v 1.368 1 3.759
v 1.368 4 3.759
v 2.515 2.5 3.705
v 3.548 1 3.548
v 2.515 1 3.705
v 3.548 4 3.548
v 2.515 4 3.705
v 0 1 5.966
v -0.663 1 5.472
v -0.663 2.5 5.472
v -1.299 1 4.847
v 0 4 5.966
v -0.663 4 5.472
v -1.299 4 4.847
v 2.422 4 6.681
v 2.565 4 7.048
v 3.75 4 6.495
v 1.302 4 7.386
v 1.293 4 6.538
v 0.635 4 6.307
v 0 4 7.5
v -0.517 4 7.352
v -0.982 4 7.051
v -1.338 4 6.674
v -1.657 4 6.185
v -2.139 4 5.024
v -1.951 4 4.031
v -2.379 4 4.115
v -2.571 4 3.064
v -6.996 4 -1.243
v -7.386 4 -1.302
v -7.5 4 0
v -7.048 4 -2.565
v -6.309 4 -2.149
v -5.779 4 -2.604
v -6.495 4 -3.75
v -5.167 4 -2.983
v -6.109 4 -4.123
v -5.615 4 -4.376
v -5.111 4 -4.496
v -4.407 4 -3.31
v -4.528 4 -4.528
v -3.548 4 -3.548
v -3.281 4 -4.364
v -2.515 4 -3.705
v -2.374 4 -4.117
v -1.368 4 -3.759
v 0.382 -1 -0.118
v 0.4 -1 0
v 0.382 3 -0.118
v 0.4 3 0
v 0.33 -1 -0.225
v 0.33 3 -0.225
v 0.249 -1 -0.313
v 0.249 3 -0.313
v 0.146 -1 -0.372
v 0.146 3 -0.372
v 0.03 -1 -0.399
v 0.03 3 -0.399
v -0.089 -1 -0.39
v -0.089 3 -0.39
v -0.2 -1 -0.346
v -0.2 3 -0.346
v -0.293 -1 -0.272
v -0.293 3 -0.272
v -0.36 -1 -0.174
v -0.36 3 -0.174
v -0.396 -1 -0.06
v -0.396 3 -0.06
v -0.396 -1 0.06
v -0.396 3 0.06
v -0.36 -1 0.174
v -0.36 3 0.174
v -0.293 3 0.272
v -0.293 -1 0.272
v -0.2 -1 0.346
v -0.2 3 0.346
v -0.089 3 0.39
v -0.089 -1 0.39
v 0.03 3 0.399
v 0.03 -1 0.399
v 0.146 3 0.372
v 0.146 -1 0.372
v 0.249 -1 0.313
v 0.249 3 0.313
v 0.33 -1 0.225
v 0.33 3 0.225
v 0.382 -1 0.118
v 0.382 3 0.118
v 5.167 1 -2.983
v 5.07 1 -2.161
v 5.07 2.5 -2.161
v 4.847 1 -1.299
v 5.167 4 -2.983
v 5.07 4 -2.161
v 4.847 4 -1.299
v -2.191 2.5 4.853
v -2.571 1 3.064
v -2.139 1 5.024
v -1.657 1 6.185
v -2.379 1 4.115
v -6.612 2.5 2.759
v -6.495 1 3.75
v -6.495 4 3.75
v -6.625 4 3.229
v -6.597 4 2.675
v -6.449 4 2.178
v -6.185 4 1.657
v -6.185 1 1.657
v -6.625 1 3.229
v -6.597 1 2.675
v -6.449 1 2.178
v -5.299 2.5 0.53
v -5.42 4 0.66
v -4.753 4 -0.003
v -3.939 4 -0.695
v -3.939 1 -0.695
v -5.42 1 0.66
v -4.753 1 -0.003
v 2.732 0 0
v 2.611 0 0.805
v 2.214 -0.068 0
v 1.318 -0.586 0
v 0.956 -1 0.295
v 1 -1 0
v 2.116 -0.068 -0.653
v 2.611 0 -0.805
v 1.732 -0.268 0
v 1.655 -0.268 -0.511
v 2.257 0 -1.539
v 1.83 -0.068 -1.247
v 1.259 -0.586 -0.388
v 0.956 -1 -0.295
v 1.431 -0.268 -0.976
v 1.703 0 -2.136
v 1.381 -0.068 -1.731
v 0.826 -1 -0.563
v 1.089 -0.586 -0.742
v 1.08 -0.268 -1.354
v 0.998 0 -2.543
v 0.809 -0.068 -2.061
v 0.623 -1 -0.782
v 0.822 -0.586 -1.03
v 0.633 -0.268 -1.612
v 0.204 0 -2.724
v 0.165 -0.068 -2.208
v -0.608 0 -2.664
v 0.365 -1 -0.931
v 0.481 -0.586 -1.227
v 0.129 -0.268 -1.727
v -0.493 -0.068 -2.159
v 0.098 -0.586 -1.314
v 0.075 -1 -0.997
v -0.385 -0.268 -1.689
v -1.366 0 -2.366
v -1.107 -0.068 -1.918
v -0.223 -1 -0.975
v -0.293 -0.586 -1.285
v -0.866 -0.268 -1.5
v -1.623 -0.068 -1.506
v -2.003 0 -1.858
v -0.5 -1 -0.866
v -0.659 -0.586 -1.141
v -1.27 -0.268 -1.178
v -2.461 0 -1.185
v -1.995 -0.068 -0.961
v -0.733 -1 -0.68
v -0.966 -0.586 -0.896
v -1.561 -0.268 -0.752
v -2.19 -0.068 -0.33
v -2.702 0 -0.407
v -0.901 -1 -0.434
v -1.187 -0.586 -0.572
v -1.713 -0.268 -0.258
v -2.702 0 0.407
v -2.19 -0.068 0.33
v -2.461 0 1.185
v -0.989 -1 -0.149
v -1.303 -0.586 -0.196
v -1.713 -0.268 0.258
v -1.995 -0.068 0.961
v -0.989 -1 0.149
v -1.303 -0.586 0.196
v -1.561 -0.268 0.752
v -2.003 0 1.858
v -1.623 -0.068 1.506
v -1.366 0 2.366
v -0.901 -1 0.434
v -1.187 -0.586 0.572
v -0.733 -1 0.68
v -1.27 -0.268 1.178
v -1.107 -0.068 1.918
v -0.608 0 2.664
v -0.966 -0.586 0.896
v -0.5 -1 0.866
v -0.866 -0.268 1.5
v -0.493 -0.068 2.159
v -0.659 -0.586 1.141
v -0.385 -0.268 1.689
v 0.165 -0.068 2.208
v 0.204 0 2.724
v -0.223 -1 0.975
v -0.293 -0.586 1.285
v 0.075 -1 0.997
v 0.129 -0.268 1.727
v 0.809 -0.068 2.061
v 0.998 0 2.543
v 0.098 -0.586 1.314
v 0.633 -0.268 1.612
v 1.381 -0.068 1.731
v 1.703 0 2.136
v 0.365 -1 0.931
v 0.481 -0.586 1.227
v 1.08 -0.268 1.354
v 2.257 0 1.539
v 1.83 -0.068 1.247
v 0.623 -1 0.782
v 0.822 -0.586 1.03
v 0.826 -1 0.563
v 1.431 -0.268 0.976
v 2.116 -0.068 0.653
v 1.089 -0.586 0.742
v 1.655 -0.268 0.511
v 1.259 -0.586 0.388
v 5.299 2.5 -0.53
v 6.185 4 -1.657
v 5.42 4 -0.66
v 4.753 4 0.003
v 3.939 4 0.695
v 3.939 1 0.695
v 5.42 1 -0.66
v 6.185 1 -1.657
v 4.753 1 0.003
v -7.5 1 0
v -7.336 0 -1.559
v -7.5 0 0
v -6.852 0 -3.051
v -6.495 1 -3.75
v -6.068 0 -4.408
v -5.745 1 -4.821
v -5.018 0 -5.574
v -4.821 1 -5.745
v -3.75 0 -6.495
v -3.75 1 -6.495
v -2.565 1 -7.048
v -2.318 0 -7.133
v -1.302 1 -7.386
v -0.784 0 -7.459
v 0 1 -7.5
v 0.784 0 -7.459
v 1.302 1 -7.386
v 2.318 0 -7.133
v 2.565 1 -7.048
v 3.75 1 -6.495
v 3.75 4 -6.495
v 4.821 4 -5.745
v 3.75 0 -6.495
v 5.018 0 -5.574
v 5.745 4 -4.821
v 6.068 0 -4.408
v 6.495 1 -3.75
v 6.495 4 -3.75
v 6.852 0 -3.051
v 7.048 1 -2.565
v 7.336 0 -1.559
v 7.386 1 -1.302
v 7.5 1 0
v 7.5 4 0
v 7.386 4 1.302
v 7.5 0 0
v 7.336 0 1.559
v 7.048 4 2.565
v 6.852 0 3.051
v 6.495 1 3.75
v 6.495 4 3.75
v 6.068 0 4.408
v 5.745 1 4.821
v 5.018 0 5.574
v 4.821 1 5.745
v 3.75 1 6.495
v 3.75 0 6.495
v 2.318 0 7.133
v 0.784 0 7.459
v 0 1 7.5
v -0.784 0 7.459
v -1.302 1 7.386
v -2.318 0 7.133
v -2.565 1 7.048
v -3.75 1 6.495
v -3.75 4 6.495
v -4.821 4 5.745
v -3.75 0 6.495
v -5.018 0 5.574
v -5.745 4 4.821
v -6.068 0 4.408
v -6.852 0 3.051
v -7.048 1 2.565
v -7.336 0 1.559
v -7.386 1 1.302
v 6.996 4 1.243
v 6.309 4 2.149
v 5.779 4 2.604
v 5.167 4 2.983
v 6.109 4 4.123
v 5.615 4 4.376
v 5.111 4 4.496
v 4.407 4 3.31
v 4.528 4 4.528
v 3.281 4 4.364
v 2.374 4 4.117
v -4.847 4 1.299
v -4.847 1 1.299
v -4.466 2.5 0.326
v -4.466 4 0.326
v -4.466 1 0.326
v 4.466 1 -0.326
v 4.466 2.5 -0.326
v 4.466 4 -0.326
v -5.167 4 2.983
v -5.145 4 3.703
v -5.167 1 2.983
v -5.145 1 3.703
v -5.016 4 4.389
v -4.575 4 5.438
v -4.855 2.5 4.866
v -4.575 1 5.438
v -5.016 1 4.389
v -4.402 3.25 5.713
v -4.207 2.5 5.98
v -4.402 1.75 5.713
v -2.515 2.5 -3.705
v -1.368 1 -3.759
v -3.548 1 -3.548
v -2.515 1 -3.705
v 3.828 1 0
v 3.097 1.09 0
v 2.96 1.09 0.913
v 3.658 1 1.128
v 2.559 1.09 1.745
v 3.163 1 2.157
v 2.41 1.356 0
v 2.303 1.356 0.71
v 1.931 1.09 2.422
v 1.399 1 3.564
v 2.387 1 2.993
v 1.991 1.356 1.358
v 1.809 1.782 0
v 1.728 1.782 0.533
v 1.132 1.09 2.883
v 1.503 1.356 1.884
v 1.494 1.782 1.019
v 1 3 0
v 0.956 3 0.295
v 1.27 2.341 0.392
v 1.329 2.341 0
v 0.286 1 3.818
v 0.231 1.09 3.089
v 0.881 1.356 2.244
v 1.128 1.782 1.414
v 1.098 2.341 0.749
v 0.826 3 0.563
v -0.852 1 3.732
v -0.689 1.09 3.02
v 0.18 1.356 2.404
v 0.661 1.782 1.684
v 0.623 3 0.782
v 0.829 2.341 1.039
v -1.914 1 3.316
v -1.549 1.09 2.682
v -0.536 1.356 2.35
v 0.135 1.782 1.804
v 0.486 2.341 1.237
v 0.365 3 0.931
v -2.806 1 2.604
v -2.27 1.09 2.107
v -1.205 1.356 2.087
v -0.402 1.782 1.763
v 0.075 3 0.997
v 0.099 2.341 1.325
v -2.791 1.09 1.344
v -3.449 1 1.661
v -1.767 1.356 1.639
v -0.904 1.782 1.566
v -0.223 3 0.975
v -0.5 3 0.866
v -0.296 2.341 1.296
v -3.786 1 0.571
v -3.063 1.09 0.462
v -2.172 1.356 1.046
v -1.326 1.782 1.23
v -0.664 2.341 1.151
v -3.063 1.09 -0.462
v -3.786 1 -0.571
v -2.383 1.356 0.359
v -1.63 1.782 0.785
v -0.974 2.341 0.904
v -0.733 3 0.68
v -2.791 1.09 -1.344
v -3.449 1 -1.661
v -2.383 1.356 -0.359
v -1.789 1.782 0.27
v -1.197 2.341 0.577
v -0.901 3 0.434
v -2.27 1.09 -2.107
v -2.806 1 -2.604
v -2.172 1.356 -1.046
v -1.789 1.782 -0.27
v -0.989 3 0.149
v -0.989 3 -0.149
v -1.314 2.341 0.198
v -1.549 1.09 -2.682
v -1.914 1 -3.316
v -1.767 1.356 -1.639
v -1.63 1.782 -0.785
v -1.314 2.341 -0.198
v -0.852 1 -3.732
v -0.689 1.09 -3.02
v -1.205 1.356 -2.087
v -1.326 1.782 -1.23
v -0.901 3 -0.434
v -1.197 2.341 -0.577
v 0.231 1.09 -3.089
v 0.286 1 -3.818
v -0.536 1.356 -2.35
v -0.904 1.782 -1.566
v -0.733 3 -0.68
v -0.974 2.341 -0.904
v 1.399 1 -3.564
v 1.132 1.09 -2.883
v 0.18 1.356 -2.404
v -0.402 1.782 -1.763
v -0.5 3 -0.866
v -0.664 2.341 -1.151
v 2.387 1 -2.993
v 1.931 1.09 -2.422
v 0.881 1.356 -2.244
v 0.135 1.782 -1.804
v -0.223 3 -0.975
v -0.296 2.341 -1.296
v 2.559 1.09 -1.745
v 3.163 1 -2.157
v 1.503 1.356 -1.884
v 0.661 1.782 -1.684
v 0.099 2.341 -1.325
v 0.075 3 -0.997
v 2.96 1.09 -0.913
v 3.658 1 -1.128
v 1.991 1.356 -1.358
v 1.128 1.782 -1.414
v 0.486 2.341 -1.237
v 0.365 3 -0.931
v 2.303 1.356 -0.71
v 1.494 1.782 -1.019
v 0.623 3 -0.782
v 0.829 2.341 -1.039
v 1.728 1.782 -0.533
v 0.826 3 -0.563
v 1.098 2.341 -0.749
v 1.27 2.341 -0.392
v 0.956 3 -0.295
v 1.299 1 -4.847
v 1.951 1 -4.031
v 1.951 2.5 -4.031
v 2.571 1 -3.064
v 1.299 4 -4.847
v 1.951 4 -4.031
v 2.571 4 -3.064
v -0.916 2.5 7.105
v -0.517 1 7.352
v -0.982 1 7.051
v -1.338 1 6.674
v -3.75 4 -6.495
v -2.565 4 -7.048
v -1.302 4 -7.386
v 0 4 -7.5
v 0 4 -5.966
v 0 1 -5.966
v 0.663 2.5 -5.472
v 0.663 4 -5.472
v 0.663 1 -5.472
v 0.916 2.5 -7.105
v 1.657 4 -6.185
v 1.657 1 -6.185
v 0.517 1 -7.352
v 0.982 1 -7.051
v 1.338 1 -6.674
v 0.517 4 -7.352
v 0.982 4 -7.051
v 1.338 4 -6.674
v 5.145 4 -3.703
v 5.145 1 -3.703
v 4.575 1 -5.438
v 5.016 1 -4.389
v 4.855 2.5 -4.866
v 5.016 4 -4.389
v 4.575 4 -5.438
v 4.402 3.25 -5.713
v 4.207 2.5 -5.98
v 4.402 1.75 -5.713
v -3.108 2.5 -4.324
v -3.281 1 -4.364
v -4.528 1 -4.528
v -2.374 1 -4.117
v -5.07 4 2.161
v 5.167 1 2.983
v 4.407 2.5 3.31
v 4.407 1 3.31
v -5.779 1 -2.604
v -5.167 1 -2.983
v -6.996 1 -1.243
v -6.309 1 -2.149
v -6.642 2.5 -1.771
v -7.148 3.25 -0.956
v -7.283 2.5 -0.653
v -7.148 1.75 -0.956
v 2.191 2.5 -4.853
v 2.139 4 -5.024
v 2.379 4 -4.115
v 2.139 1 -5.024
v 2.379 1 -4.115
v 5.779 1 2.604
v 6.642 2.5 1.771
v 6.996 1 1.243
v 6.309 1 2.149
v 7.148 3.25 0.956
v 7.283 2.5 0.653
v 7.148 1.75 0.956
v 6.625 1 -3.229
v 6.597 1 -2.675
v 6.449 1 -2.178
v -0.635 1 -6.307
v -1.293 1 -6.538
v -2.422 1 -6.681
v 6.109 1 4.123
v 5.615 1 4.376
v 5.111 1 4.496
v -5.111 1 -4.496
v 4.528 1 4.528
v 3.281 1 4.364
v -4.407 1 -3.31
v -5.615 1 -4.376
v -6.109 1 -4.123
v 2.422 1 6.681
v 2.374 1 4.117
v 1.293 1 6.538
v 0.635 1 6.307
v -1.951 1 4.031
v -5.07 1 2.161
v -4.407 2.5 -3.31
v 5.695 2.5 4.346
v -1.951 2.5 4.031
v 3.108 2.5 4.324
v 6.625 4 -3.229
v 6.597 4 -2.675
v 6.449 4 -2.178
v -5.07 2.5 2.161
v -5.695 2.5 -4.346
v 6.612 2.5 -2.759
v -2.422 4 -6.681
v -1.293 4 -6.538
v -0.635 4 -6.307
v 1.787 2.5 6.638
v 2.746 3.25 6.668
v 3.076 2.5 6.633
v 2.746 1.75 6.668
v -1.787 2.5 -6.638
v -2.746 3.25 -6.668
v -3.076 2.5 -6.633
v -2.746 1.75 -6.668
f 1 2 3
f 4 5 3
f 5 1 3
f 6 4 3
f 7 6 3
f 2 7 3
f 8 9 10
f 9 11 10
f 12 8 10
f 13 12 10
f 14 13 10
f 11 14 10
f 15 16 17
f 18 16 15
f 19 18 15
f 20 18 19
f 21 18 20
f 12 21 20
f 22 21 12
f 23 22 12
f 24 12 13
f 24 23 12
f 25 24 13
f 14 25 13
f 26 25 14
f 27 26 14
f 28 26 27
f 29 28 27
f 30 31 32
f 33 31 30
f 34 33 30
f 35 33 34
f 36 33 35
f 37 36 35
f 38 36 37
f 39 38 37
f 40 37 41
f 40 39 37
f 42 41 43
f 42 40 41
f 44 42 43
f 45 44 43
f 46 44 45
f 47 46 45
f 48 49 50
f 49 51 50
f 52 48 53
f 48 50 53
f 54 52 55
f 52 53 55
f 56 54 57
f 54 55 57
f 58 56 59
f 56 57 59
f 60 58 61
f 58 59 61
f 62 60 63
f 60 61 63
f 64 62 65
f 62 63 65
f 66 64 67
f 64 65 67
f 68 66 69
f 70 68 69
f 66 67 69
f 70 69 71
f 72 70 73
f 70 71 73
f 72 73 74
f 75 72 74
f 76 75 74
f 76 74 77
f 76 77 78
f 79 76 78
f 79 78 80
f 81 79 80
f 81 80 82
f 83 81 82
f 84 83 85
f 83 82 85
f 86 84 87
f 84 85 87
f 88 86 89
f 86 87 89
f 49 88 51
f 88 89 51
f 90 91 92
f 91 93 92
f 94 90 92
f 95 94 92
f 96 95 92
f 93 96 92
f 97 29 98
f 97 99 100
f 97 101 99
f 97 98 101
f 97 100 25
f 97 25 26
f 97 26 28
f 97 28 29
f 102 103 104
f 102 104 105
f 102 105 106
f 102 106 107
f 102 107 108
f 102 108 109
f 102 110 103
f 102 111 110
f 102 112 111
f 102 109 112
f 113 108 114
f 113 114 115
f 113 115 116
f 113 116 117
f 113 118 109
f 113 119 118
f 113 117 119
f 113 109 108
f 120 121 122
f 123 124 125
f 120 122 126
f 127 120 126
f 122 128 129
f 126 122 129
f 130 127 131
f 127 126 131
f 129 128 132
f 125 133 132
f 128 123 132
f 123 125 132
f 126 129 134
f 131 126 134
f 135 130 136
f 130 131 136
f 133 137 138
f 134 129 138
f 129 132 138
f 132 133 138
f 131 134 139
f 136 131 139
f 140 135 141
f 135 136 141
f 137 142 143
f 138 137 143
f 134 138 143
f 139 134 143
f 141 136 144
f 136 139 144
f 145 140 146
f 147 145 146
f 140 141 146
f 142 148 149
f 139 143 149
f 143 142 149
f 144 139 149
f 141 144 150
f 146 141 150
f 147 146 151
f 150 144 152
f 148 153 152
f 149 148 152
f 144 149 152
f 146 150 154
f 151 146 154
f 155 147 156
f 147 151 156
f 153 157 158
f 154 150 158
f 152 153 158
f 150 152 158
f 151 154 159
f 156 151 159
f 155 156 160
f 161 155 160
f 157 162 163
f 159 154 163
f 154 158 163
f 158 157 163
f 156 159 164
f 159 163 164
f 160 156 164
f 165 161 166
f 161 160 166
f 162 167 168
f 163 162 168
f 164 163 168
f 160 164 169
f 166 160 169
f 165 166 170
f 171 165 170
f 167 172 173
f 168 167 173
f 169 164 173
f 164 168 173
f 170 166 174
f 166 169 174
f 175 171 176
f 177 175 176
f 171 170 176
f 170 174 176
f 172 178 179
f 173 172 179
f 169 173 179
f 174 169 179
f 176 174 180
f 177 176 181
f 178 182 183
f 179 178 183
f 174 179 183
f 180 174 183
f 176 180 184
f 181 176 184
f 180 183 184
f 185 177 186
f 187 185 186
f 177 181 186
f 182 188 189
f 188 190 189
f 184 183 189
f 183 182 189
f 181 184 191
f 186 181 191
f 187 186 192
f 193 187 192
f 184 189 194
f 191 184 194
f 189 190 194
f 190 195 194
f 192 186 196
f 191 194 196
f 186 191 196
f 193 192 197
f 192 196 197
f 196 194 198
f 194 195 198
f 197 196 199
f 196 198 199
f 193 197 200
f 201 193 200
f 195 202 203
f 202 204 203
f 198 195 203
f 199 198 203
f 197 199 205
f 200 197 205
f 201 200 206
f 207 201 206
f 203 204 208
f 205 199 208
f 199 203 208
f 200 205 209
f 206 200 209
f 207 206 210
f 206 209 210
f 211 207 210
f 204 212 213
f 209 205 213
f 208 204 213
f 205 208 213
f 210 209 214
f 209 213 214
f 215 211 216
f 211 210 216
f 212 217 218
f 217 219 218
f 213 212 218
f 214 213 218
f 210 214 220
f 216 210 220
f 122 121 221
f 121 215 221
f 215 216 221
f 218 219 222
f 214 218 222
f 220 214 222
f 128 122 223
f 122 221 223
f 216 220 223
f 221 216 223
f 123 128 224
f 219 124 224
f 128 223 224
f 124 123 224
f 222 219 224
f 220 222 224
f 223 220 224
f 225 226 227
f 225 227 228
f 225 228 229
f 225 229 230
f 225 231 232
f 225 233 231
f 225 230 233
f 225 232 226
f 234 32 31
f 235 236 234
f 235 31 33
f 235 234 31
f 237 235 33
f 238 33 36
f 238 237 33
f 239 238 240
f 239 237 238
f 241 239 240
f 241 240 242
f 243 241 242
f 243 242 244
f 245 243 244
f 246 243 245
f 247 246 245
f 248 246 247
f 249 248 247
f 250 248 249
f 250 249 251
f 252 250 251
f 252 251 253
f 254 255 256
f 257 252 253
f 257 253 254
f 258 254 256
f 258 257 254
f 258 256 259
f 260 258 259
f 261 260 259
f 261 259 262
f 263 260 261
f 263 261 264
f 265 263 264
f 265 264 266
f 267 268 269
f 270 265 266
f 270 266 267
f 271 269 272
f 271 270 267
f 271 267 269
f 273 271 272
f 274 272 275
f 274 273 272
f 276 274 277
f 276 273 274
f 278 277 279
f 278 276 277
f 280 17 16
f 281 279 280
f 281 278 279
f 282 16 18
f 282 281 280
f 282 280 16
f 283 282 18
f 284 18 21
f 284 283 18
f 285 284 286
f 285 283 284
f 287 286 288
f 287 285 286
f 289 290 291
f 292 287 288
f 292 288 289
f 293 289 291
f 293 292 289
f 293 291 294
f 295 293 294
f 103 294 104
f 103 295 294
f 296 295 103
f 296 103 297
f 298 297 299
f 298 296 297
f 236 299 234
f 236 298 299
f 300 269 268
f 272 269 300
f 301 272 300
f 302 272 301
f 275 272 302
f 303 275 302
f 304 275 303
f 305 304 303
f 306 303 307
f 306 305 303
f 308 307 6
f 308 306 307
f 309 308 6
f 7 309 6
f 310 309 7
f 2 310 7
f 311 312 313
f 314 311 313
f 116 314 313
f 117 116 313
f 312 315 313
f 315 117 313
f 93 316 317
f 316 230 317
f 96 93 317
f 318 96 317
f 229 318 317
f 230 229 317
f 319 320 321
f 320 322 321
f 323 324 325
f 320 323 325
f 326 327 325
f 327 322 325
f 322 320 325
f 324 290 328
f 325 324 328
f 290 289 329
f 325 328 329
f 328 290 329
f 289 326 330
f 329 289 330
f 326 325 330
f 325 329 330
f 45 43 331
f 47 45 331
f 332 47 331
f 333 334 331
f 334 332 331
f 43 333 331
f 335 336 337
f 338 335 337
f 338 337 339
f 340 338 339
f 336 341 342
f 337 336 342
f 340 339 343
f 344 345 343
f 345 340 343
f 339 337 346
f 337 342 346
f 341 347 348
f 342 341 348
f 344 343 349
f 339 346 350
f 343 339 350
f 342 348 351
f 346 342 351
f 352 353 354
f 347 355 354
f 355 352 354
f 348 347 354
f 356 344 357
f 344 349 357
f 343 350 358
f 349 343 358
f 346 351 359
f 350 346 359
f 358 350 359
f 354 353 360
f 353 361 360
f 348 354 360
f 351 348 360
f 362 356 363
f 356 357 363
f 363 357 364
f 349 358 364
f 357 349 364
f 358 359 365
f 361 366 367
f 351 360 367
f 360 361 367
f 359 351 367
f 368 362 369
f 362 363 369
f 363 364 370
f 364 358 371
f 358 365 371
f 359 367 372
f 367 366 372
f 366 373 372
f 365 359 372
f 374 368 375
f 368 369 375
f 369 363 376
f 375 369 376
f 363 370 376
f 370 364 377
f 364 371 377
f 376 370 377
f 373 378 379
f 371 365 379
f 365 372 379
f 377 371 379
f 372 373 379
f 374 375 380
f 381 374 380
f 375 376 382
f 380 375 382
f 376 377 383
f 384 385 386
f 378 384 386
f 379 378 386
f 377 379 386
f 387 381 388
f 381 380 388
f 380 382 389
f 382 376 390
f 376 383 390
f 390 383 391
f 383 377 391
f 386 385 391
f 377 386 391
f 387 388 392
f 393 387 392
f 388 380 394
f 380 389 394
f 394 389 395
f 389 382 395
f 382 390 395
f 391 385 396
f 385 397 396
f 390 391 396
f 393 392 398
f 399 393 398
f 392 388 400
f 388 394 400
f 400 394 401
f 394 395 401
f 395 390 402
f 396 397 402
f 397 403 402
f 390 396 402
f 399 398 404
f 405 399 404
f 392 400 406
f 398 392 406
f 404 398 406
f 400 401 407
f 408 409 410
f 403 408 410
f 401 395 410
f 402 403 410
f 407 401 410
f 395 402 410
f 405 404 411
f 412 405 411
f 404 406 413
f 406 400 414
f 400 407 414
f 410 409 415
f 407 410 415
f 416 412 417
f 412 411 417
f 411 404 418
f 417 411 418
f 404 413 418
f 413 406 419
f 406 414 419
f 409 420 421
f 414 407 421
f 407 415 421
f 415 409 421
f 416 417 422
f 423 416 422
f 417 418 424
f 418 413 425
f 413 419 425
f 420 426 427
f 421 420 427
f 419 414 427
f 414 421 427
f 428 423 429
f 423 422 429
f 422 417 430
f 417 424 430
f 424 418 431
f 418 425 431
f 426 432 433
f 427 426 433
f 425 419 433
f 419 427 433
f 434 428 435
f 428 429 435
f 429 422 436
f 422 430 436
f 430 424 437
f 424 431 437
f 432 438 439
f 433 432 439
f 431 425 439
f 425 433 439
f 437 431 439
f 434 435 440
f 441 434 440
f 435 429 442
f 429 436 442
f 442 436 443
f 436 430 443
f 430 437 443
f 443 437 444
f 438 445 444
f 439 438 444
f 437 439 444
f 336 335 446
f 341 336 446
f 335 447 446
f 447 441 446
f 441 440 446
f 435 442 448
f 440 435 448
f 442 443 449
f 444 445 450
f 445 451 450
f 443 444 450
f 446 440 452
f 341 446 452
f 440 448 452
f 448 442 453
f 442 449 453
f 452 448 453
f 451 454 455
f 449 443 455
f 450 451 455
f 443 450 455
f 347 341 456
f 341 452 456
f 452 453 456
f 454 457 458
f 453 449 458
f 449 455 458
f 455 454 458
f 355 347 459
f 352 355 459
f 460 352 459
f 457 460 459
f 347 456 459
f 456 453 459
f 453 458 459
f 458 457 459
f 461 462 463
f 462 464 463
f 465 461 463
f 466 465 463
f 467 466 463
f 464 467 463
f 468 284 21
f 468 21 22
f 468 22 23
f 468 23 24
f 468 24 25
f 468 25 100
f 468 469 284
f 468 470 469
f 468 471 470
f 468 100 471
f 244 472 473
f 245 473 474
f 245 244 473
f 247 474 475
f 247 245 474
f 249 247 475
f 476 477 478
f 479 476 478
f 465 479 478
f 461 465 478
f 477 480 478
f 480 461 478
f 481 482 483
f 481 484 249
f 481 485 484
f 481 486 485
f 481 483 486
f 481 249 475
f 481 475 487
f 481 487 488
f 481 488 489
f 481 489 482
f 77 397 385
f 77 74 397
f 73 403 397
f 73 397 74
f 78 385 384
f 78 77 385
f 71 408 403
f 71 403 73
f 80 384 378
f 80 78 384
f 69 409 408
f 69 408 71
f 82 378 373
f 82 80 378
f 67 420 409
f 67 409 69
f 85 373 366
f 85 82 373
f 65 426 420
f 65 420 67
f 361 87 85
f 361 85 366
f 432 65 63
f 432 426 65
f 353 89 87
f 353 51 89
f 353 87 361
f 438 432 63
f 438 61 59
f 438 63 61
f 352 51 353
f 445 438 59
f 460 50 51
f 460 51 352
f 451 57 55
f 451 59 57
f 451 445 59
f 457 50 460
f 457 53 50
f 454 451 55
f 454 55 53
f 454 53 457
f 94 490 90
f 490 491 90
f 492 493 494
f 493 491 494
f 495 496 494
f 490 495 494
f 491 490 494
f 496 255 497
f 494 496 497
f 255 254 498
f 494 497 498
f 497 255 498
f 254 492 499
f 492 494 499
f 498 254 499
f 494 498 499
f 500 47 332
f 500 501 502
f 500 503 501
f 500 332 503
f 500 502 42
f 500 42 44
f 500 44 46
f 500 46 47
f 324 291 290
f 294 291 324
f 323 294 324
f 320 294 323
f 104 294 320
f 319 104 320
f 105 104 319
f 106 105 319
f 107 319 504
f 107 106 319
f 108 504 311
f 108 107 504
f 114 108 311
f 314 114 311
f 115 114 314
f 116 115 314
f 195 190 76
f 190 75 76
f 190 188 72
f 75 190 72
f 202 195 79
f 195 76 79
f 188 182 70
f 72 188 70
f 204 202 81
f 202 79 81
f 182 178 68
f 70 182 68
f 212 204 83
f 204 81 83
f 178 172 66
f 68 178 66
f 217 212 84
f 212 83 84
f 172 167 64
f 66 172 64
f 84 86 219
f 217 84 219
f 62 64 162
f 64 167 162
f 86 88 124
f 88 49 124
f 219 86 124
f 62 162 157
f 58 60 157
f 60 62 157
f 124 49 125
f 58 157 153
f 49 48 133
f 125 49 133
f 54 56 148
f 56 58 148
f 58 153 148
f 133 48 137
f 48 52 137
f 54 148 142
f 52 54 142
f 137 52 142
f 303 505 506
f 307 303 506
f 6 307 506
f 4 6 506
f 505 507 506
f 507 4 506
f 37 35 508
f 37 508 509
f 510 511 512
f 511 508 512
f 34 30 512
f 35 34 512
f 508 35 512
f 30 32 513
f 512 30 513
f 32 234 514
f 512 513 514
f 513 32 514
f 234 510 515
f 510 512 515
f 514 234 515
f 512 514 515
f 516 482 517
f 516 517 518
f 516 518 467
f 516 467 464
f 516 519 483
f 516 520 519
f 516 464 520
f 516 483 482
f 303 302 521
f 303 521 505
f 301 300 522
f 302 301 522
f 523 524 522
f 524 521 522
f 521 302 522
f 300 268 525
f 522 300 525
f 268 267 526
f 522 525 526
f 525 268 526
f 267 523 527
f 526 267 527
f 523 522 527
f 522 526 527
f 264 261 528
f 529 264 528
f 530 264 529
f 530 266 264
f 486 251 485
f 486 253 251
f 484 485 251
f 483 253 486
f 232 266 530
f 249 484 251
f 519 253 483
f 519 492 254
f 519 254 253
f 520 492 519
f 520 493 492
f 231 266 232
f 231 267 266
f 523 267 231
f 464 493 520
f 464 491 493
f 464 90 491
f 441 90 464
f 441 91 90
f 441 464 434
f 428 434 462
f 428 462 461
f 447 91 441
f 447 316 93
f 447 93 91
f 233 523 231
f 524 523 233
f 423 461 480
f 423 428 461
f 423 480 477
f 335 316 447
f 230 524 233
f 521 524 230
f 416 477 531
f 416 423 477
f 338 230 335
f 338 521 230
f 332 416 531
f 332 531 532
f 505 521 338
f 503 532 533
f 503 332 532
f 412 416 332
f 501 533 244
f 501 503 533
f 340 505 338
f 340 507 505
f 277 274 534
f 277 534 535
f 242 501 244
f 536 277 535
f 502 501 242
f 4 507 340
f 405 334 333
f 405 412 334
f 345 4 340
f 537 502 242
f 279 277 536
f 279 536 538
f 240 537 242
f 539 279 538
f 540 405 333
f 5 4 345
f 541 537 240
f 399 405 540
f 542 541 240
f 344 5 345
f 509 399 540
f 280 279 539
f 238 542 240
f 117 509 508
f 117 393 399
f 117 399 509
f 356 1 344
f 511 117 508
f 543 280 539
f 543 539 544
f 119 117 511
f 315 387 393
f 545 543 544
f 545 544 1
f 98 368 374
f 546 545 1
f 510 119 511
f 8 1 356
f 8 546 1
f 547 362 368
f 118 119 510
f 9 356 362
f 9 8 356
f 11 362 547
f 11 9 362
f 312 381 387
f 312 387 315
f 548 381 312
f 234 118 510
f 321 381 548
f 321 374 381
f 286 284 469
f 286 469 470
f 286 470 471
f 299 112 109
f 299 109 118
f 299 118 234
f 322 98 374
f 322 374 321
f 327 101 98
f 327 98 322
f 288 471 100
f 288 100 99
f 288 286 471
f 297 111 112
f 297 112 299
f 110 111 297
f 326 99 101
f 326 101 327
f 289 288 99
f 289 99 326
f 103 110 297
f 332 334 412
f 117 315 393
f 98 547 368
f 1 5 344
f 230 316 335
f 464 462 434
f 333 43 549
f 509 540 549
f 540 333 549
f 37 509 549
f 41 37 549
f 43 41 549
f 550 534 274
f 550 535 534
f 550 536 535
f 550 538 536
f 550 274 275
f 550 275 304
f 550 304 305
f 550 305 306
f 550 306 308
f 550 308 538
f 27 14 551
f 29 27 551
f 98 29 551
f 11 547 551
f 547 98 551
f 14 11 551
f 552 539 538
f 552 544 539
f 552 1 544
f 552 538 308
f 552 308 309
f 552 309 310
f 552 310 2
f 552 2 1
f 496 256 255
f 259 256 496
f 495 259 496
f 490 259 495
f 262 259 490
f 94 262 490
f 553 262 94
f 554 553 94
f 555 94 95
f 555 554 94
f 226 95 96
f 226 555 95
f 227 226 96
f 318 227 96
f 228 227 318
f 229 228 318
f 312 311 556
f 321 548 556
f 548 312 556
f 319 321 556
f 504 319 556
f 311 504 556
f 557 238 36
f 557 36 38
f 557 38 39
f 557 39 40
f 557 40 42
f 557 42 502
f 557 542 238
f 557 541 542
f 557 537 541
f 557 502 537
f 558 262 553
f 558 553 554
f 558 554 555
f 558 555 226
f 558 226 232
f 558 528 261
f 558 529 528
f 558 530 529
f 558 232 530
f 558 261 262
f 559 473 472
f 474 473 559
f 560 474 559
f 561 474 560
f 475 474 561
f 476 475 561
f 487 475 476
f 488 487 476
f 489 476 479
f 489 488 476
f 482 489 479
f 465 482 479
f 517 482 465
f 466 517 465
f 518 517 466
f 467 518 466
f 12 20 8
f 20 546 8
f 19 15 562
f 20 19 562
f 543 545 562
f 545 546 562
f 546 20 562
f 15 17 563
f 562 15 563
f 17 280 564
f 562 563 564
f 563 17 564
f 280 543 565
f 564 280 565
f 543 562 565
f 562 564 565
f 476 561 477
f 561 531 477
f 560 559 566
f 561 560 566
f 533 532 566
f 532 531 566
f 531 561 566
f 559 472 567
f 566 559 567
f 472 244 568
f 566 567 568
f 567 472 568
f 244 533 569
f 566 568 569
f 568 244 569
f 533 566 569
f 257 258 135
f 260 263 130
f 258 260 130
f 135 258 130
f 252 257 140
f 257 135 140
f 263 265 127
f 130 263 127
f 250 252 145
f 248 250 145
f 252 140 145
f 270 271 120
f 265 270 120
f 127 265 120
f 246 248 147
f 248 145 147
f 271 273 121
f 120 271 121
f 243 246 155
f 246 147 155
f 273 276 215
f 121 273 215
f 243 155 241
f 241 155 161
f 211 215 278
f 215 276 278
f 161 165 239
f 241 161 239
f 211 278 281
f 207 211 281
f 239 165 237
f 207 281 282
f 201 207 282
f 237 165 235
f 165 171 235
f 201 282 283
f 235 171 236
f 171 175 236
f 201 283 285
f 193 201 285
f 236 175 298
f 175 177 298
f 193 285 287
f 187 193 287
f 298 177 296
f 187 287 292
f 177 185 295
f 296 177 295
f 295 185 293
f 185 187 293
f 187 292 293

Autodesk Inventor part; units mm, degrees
ref_plane "YZ Plane" through (0, 0, 0) normal (1, 0, 0) x (0, 1, 0)
ref_plane "XZ Plane" through (0, 0, 0) normal (0, 1, 0) x (-1, 0, 0)
ref_plane "XY Plane" through (0, 0, 0) normal (0, 0, 1) x (1, 0, 0)
sketch "スケッチ1" plane through (0, 0, 0) normal (0, 1, 0) x (-1, 0, 0)
  circle A0 centre (0, 0) radius 7.5
  dimension "d0" = 15
extrude "押し出し1" add sketch "スケッチ1" along normal blind 1
sketch "スケッチ2" plane through (0, 1, 0) normal (0, 1, 0) x (1, 0, 0)
  circle A0 centre (0, 0) radius 7.5 projected
  line L0 (0, 0) -> (-7.5, 0)
  line L1 (0, 0) -> (-1.3681, 3.7588)
  line L2 (-7.5, 0) -> (-6.4952, 3.75) construction
  line L3 (-6.4952, 3.75) -> (-1.3681, 3.7588) construction
  spline S0 degree 2 poles (-7.5, 0) (-6.4952, 3.75) (-1.3681, 3.7588) knots 1 1 1 2 2 2
  line L4 (-6.4952, 3.75) -> (-5.3033, 5.3033) construction
  line L5 (-5.3033, 5.3033) -> (-1.3681, 3.7588) construction
  spline S1 degree 2 poles (-6.4952, 3.75) (-5.3033, 5.3033) (-1.3681, 3.7588) knots 1 1 1 2 2 2
  line L6 (0, 0) -> (-5.3033, 5.3033)
  line L7 (-6.4952, 3.75) -> (0, 0)
  point P0 (-6.4952, 3.75)
  dimension "d5" = 70
  dimension "d14" = 4
  dimension "d18" = 25
  dimension "d19" = 15
extrude "押し出し2" add sketch "スケッチ2" along normal blind 3 contours A0 L7 S0 | S1 L6 S0 L7 | S1 S0 L6
pattern_circular "円形状パターン1" count 6 over 360 about axis through (0, 1, 0) along (0, 1, 0) of "押し出し2"
sketch "スケッチ4" plane through (0, 1, 0) normal (0, 1, 0) x (1, 0, 0)
  circle A0 centre (0, 0) radius 1
  dimension "d20" = 2
extrude "押し出し4" add sketch "スケッチ4" along normal blind 2 and the other way blind 2
fillet "フィレット1" radius 3 1 edges at (-1, 1, 0)
sketch "スケッチ5" plane through (0, 3, 0) normal (0, 1, 0) x (1, 0, 0)
  circle A0 centre (0, 0) radius 0.4
  dimension "d24" = 0.8
extrude "押し出し5" cut sketch "スケッチ5" against normal through all
fillet "フィレット2" radius 2 1 edges at (-1, 0, 0)
properties part number "Fan2"
